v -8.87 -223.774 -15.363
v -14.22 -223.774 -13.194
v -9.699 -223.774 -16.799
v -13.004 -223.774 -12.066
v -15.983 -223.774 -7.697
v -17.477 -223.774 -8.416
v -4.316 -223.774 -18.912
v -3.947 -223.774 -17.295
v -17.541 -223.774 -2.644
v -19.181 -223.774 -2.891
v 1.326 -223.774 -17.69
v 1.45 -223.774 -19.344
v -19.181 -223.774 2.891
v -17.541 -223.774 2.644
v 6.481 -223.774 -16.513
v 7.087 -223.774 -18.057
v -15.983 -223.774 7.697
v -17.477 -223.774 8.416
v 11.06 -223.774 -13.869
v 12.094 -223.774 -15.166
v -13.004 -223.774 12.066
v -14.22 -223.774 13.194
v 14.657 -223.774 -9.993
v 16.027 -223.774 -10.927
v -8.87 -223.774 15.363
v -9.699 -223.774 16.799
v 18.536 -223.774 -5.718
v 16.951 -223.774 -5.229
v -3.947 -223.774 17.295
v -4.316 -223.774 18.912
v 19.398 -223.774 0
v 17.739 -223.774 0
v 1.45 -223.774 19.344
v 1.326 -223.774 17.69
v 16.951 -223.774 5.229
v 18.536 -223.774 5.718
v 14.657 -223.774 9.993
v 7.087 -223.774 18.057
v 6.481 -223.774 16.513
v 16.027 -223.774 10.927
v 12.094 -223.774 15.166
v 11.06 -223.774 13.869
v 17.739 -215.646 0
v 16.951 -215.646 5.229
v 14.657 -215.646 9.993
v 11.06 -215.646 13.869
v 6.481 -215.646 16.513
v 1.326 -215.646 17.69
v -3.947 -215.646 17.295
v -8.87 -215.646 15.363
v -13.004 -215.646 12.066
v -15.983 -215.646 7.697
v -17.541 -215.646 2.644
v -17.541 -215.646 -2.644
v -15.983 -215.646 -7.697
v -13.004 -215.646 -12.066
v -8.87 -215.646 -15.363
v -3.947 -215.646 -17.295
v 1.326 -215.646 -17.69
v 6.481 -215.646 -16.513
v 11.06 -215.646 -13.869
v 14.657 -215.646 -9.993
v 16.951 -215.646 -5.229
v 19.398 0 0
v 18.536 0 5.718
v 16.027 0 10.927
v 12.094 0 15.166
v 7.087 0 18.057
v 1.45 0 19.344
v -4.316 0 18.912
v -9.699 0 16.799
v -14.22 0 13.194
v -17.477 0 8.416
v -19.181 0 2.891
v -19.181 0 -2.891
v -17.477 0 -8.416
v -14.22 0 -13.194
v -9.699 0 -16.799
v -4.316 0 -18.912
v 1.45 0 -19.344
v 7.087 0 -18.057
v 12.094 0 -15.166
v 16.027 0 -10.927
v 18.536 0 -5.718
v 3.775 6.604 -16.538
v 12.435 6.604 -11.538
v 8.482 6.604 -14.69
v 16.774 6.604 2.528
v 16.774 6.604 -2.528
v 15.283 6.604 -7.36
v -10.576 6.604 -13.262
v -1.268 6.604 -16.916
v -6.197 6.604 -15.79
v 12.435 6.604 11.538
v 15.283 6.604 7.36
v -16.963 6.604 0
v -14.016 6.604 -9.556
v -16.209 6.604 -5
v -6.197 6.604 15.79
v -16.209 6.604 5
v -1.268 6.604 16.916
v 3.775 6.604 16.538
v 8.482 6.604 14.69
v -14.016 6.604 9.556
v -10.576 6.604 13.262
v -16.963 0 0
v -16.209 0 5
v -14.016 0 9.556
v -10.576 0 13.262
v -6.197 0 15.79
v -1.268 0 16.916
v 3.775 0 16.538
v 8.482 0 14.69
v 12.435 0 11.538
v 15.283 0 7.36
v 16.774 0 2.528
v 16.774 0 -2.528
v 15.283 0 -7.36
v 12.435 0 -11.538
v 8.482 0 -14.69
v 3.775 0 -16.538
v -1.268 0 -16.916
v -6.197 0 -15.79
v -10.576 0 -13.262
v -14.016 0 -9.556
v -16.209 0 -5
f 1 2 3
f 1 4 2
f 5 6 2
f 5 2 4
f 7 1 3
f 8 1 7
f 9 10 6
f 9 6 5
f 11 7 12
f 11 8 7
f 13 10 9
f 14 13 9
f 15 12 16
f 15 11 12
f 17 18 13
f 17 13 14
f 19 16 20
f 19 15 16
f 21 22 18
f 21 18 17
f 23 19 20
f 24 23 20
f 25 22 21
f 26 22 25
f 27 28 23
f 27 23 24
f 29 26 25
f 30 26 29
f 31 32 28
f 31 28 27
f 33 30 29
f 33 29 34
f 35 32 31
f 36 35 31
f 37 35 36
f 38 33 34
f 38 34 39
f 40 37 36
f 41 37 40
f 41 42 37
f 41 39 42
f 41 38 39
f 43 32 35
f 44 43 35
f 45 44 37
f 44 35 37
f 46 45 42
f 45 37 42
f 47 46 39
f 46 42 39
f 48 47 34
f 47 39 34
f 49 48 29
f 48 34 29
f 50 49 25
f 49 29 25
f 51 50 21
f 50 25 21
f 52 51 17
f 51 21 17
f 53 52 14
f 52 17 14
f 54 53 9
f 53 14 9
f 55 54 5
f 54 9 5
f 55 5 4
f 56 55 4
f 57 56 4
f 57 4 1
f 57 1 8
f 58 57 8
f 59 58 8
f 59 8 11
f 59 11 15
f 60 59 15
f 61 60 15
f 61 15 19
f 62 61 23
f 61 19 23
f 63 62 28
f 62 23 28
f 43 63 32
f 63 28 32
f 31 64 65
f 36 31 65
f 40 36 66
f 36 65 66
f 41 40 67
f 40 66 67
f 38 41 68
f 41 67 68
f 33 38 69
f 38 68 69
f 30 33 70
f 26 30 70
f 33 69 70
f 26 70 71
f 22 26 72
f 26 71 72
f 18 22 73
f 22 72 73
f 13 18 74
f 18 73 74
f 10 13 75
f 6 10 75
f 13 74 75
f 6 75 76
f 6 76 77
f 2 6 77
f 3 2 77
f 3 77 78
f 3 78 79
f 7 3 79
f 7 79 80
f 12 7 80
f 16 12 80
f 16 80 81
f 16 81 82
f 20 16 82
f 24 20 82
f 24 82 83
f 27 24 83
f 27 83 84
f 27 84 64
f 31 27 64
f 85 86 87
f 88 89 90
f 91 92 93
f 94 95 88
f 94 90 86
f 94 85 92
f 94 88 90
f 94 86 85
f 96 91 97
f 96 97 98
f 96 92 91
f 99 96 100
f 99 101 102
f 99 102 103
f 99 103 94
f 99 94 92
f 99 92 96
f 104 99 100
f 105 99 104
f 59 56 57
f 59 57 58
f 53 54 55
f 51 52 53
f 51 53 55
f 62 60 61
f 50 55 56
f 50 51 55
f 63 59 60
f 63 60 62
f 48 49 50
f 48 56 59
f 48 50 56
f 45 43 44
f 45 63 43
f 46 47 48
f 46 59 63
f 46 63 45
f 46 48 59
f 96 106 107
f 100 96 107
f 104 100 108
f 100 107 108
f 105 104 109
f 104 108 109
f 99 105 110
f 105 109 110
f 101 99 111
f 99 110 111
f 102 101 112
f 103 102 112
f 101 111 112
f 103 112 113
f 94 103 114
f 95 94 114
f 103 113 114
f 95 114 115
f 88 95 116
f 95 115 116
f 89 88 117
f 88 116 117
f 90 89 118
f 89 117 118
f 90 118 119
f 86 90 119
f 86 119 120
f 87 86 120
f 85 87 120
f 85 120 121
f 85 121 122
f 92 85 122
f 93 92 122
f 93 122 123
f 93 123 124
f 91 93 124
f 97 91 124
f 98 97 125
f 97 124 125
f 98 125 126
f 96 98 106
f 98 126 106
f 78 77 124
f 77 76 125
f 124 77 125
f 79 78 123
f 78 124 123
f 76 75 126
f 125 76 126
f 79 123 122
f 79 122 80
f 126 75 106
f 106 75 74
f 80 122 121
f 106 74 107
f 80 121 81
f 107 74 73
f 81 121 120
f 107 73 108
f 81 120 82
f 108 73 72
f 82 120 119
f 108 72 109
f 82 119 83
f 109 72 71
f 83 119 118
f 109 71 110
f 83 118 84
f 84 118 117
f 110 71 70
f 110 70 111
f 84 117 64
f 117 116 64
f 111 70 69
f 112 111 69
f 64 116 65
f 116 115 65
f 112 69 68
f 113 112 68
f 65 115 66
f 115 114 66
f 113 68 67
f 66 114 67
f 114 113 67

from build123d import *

# Parameters (mm, degrees)
F0_R      = 19.397954
F1_DEPTH  = 223.774
F2_R      = 16.963017
F3_DEPTH  = 6.604
F1_FACE_R = 19.397954
F4_DEPTH  = 5.08
F5_R      = 17.739386
F6_DEPTH  = 8.128


with BuildPart() as f1:
    # F0 (on Front) → F1 (new body)
    with BuildSketch(Plane.XZ):
        Circle(F0_R)
    extrude(amount=F1_DEPTH)

    # F2 (on face) → F3 (join)
    with BuildSketch(Plane(origin=(0, 0, 0), x_dir=(-1, 0, 0), z_dir=(0, 1, 0))):
        Circle(F2_R)
    extrude(amount=F3_DEPTH)

    # F1_face (on face) → F4 (join)
    with BuildSketch(Plane(origin=(0, 0, 0), x_dir=(1, 0, 0), z_dir=(0, 1, 0))):
        Circle(F1_FACE_R)
    extrude(amount=-F4_DEPTH)

    # F5 (on face) → F6 (cut)
    with BuildSketch(Plane.XZ.offset(223.774)):
        Circle(F5_R)
    extrude(amount=-F6_DEPTH, mode=Mode.SUBTRACT)


solid = f1.part
